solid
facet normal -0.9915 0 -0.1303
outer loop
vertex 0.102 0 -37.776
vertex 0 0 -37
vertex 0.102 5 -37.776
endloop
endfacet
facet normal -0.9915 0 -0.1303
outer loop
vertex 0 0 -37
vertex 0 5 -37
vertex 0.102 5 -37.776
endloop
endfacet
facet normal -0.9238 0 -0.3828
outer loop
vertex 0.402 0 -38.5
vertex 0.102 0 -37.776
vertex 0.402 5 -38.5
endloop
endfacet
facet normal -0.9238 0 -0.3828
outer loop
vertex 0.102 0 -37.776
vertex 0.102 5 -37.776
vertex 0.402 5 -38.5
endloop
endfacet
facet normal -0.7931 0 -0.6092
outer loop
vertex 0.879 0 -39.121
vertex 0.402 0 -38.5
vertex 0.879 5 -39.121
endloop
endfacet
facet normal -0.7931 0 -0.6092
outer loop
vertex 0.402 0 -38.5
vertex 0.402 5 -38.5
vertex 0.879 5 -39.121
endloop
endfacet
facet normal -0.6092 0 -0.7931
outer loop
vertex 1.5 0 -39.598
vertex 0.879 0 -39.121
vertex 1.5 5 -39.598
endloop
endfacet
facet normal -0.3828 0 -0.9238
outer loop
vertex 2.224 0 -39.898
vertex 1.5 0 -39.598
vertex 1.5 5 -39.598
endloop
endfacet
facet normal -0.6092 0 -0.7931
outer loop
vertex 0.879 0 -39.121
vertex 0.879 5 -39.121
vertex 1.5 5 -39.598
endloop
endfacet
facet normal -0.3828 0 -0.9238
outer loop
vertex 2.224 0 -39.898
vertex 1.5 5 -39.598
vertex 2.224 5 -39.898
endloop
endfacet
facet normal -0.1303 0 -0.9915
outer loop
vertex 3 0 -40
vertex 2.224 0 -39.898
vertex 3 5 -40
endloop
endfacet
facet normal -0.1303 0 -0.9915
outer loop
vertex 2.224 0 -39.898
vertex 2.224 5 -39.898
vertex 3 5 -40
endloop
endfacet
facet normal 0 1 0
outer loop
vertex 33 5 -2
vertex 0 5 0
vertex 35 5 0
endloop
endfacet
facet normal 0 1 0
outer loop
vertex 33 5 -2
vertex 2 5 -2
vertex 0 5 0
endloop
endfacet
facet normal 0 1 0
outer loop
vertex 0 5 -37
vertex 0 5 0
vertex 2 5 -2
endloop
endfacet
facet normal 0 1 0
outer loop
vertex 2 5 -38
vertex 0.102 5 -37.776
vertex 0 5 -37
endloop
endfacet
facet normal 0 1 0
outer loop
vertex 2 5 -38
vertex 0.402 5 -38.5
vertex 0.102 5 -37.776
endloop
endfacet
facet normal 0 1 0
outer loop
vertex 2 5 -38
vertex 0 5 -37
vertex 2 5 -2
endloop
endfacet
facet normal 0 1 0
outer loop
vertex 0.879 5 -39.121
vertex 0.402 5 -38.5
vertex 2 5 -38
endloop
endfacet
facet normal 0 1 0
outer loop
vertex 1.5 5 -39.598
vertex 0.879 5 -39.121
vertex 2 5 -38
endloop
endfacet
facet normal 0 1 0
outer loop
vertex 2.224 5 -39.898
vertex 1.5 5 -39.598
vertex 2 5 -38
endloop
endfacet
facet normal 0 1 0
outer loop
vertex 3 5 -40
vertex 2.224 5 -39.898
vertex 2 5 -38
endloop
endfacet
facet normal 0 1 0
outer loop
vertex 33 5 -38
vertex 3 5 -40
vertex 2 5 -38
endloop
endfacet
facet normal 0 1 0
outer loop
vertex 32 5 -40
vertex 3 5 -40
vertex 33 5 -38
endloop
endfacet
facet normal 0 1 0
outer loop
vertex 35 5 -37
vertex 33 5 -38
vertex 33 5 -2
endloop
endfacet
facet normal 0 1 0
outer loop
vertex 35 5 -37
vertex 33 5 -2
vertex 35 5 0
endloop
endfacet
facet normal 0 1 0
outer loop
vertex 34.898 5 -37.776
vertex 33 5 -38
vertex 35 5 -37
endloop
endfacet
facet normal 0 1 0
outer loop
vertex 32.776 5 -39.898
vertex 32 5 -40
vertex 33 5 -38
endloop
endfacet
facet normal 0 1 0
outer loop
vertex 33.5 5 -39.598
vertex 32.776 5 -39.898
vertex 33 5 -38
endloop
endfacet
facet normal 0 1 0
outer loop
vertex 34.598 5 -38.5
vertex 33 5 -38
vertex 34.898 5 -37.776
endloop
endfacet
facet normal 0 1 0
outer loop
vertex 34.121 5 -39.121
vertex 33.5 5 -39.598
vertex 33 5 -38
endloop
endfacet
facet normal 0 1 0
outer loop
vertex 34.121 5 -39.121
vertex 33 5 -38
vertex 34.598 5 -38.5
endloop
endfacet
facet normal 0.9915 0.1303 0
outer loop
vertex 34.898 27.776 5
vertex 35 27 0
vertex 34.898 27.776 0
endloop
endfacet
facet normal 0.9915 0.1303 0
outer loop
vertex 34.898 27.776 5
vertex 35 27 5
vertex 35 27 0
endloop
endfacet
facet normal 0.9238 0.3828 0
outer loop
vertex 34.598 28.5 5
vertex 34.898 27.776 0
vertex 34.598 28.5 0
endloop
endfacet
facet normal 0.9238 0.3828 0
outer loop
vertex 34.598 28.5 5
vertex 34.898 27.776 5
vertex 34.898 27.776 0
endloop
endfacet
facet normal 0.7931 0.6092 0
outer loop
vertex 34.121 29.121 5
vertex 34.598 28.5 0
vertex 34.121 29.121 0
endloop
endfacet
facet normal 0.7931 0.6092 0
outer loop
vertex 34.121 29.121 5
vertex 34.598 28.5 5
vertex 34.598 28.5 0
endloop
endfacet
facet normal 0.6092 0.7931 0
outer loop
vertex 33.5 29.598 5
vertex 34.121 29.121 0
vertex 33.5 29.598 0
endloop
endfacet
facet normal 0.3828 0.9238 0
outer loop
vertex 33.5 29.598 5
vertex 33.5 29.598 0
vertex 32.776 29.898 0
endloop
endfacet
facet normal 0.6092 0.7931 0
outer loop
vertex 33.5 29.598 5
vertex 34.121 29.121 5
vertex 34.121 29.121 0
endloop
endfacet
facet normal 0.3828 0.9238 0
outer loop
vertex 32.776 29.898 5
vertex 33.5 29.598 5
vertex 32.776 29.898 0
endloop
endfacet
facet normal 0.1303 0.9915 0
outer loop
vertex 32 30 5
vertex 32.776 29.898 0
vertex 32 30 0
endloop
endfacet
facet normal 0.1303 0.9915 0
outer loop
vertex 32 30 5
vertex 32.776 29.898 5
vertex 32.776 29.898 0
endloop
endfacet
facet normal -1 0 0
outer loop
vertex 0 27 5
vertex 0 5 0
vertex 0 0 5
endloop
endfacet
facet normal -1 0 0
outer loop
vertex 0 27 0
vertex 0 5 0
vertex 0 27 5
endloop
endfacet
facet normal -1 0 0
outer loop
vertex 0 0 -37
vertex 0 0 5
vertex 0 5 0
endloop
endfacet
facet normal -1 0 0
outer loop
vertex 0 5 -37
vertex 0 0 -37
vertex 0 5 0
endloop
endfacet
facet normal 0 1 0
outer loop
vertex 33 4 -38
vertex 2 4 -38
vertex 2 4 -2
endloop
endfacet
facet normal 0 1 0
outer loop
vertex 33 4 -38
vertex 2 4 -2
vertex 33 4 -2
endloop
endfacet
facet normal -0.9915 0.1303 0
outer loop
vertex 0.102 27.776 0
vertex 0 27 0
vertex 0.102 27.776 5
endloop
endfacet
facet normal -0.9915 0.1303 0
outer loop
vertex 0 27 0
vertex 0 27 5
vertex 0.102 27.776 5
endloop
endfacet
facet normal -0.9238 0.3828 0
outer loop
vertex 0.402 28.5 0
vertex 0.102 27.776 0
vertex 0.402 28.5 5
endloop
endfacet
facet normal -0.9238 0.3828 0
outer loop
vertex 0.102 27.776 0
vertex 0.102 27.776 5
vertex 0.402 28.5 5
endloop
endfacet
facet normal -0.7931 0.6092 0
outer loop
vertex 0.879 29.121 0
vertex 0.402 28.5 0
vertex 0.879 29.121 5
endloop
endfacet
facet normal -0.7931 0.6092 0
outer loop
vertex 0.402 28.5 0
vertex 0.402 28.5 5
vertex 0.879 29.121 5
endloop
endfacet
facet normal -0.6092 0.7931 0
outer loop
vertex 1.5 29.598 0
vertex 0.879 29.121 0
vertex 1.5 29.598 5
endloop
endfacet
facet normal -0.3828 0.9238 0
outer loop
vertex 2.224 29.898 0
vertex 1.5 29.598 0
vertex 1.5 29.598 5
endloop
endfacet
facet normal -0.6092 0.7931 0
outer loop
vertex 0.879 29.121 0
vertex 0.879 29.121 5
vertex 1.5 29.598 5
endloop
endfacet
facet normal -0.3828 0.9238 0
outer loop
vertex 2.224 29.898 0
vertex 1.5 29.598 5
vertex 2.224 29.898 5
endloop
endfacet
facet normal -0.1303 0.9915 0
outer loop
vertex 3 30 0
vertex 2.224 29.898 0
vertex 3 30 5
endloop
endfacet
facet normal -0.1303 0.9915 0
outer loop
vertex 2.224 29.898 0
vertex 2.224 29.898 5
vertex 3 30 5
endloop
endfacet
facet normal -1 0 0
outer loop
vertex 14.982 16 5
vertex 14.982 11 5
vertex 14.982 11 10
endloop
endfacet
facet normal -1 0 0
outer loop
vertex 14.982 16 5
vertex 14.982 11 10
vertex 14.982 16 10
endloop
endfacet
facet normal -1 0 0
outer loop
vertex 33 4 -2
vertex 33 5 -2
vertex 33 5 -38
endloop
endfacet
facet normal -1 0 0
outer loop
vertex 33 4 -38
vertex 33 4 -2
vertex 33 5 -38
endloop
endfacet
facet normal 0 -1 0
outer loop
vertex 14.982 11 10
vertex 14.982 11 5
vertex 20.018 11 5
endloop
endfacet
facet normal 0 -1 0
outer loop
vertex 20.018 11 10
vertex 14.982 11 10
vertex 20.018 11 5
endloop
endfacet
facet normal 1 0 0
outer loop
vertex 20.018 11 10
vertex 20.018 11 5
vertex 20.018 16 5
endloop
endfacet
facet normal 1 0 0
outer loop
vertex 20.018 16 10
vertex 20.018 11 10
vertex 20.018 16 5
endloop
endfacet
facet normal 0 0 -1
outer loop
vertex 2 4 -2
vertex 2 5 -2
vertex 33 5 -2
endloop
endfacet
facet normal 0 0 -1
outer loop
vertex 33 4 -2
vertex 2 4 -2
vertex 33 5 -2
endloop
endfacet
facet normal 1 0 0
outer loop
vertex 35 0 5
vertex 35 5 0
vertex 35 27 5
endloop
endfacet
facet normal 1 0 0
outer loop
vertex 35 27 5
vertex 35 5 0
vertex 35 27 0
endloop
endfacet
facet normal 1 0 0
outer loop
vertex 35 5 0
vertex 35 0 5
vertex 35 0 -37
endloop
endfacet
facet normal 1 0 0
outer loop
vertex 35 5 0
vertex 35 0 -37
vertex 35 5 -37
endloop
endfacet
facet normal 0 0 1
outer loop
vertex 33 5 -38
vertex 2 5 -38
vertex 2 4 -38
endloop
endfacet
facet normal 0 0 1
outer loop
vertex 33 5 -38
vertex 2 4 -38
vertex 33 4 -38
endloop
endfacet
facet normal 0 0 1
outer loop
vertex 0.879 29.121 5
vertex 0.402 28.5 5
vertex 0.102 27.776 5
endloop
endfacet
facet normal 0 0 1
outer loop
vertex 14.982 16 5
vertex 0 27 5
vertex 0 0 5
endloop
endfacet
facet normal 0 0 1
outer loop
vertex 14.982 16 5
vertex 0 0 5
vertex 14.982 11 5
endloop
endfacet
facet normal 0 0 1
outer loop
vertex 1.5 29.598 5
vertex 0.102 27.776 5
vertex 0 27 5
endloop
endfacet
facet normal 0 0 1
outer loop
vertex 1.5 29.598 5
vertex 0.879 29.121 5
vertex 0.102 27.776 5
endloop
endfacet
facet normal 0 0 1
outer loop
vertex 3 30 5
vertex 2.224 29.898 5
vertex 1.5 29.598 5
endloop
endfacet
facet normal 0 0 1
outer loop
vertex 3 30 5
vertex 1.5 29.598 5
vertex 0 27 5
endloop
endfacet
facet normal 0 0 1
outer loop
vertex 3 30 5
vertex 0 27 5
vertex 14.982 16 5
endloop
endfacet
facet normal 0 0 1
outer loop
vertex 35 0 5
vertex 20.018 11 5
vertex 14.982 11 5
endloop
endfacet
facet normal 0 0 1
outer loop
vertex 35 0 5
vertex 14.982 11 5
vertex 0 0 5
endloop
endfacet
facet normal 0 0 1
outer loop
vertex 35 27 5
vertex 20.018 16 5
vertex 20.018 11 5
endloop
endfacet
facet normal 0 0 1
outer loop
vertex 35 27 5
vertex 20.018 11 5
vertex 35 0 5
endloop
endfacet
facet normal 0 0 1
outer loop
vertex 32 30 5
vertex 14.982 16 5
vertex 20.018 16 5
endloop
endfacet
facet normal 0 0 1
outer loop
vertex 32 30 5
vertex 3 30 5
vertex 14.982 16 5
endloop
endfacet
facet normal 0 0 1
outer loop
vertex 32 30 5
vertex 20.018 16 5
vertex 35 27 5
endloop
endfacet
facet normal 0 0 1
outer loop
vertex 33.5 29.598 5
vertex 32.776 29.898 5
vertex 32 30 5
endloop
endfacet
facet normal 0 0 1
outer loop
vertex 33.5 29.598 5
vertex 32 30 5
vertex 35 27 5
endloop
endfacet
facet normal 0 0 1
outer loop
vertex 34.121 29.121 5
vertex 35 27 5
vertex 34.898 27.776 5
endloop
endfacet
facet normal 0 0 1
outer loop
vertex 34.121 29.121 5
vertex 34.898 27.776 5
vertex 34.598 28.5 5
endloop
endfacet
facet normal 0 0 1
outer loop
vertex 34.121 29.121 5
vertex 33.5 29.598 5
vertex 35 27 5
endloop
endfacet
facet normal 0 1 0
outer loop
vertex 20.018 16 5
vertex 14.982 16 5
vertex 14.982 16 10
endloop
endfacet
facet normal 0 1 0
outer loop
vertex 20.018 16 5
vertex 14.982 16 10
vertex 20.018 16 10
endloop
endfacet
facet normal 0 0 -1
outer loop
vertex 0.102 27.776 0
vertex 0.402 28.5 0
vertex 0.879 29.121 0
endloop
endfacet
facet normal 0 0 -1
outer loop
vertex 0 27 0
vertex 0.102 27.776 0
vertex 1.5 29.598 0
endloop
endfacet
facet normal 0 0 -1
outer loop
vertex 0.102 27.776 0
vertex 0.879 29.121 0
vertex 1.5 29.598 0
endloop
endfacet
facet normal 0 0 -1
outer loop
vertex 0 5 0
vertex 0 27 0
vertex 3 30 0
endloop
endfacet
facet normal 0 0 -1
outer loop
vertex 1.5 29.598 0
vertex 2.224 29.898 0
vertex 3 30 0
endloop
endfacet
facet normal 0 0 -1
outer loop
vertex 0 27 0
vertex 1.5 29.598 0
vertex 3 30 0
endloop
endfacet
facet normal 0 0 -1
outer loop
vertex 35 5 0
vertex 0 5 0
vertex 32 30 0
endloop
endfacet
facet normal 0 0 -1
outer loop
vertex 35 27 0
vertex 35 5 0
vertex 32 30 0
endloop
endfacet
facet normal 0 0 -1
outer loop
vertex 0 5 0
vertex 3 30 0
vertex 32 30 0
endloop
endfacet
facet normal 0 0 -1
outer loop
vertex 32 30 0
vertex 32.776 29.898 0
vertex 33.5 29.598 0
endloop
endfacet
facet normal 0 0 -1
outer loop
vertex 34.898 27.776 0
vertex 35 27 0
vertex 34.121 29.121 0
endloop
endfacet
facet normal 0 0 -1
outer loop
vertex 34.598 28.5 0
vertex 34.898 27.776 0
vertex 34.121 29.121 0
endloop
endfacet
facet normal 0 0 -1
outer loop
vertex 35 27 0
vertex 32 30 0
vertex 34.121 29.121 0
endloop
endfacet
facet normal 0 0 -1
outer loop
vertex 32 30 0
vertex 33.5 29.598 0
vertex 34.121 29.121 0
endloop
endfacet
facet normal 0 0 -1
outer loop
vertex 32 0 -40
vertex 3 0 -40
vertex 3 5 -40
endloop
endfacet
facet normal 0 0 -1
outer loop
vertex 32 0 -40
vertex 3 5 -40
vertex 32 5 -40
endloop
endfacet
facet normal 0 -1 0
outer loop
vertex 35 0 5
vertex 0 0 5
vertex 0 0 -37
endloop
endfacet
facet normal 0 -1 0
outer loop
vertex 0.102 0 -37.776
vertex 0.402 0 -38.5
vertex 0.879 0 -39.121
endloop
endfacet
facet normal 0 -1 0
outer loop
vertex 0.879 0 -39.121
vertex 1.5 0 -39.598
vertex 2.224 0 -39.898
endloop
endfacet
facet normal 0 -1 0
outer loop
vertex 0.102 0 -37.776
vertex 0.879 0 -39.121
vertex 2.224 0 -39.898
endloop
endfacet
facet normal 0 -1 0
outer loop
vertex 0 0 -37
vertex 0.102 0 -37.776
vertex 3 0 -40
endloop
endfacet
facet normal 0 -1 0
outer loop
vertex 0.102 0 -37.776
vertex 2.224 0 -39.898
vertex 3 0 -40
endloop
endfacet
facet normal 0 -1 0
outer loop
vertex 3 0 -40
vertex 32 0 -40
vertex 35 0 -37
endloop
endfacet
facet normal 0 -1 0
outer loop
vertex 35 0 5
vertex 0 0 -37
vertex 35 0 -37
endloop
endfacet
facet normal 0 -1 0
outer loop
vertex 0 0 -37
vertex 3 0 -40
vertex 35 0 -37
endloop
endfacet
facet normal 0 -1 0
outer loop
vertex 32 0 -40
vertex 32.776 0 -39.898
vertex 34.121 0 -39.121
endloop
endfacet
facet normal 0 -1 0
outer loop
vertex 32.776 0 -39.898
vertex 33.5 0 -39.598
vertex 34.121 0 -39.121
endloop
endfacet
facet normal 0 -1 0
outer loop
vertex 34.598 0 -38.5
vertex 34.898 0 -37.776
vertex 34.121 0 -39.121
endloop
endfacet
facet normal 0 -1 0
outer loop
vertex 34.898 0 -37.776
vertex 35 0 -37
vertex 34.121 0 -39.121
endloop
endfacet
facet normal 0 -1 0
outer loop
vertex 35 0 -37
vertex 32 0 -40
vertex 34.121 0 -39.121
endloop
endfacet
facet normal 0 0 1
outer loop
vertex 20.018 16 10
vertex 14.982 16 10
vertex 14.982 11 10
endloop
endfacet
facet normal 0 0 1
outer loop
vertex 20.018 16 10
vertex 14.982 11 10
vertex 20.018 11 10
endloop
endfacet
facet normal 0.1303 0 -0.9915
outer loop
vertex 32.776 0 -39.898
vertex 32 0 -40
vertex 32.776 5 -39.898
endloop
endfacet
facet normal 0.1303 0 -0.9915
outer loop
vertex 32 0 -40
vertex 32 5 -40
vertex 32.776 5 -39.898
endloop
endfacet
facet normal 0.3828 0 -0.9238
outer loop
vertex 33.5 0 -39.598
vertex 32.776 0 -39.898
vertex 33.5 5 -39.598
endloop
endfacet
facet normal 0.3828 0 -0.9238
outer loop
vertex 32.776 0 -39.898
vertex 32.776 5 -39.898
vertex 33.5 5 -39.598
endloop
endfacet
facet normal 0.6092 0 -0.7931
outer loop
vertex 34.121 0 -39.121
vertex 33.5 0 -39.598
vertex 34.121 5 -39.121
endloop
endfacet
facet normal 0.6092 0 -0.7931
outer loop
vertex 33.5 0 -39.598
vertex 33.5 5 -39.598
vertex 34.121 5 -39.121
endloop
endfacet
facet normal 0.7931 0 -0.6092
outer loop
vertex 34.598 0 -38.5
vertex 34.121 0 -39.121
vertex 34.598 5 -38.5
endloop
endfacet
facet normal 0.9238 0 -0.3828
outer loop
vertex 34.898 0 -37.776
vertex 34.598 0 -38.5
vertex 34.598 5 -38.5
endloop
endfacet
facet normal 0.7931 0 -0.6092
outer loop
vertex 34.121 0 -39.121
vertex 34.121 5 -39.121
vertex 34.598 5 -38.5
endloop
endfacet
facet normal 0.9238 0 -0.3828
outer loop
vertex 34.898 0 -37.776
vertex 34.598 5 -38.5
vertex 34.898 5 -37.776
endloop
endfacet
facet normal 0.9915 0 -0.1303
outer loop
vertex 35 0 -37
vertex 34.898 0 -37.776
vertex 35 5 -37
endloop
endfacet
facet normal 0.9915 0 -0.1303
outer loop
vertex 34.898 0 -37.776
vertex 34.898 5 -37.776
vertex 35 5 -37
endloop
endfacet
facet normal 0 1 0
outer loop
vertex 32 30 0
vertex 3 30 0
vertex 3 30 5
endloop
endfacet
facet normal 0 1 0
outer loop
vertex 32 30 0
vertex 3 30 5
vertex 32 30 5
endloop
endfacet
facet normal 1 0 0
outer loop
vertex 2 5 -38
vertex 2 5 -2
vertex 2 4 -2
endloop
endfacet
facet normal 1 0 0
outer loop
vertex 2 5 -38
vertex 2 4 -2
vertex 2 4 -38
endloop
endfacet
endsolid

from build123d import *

# Parameters (mm, degrees)
SKETCH1_W           = 35
SKETCH1_H           = 40
BOSS_EXTRUDE1_DEPTH = 5
SKETCH2_W           = 31
SKETCH2_H           = 36
CUT_EXTRUDE1_DEPTH  = 1
SKETCH3_W           = 35
SKETCH3_H           = 30
BOSS_EXTRUDE2_DEPTH = 5
FILLET2_R           = 3
FILLET3_R           = 3
FILLET4_R           = 3
SKETCH4_W           = 5.036167186
SKETCH4_H           = 5
BOSS_EXTRUDE3_DEPTH = 5


with BuildPart() as part:
    # Sketch1 → Boss-Extrude1 (new body)
    with BuildSketch(Plane(origin=(0, 0, 0), x_dir=(1, 0, 0), z_dir=(0, 1, 0))):
        with Locations((17.5, 20)):
            Rectangle(SKETCH1_W, SKETCH1_H)
    extrude(amount=BOSS_EXTRUDE1_DEPTH)

    # Sketch2 → Cut-Extrude1 (cut)
    with BuildSketch(Plane(origin=(0, 5, 0), x_dir=(1, 0, 0), z_dir=(0, 1, 0))):
        with Locations((17.5, 20)):
            Rectangle(SKETCH2_W, SKETCH2_H)
    extrude(amount=-CUT_EXTRUDE1_DEPTH, mode=Mode.SUBTRACT)

    # Sketch3 → Boss-Extrude2 (add)
    with BuildSketch(Plane.XY):
        with Locations((17.5, 15)):
            Rectangle(SKETCH3_W, SKETCH3_H)
    extrude(amount=BOSS_EXTRUDE2_DEPTH)

    # Fillet2
    fillet2_edges = [part.edges().sort_by_distance(p)[0] for p in [
        (0, 2.5, -40),
    ]]
    fillet(fillet2_edges, radius=FILLET2_R)

    # Fillet3
    fillet3_edges = [part.edges().sort_by_distance(p)[0] for p in [
        (35, 2.5, -40),
    ]]
    fillet(fillet3_edges, radius=FILLET3_R)

    # Fillet4
    fillet4_edges = [part.edges().sort_by_distance(p)[0] for p in [
        (0, 30, 2.5),
        (35, 30, 2.5),
    ]]
    fillet(fillet4_edges, radius=FILLET4_R)

    # Sketch4 → Boss-Extrude3 (add)
    with BuildSketch(Plane.XY.offset(5)):
        with Locations((17.5, 13.5)):
            Rectangle(SKETCH4_W, SKETCH4_H)
    extrude(amount=BOSS_EXTRUDE3_DEPTH)


solid = part.part
